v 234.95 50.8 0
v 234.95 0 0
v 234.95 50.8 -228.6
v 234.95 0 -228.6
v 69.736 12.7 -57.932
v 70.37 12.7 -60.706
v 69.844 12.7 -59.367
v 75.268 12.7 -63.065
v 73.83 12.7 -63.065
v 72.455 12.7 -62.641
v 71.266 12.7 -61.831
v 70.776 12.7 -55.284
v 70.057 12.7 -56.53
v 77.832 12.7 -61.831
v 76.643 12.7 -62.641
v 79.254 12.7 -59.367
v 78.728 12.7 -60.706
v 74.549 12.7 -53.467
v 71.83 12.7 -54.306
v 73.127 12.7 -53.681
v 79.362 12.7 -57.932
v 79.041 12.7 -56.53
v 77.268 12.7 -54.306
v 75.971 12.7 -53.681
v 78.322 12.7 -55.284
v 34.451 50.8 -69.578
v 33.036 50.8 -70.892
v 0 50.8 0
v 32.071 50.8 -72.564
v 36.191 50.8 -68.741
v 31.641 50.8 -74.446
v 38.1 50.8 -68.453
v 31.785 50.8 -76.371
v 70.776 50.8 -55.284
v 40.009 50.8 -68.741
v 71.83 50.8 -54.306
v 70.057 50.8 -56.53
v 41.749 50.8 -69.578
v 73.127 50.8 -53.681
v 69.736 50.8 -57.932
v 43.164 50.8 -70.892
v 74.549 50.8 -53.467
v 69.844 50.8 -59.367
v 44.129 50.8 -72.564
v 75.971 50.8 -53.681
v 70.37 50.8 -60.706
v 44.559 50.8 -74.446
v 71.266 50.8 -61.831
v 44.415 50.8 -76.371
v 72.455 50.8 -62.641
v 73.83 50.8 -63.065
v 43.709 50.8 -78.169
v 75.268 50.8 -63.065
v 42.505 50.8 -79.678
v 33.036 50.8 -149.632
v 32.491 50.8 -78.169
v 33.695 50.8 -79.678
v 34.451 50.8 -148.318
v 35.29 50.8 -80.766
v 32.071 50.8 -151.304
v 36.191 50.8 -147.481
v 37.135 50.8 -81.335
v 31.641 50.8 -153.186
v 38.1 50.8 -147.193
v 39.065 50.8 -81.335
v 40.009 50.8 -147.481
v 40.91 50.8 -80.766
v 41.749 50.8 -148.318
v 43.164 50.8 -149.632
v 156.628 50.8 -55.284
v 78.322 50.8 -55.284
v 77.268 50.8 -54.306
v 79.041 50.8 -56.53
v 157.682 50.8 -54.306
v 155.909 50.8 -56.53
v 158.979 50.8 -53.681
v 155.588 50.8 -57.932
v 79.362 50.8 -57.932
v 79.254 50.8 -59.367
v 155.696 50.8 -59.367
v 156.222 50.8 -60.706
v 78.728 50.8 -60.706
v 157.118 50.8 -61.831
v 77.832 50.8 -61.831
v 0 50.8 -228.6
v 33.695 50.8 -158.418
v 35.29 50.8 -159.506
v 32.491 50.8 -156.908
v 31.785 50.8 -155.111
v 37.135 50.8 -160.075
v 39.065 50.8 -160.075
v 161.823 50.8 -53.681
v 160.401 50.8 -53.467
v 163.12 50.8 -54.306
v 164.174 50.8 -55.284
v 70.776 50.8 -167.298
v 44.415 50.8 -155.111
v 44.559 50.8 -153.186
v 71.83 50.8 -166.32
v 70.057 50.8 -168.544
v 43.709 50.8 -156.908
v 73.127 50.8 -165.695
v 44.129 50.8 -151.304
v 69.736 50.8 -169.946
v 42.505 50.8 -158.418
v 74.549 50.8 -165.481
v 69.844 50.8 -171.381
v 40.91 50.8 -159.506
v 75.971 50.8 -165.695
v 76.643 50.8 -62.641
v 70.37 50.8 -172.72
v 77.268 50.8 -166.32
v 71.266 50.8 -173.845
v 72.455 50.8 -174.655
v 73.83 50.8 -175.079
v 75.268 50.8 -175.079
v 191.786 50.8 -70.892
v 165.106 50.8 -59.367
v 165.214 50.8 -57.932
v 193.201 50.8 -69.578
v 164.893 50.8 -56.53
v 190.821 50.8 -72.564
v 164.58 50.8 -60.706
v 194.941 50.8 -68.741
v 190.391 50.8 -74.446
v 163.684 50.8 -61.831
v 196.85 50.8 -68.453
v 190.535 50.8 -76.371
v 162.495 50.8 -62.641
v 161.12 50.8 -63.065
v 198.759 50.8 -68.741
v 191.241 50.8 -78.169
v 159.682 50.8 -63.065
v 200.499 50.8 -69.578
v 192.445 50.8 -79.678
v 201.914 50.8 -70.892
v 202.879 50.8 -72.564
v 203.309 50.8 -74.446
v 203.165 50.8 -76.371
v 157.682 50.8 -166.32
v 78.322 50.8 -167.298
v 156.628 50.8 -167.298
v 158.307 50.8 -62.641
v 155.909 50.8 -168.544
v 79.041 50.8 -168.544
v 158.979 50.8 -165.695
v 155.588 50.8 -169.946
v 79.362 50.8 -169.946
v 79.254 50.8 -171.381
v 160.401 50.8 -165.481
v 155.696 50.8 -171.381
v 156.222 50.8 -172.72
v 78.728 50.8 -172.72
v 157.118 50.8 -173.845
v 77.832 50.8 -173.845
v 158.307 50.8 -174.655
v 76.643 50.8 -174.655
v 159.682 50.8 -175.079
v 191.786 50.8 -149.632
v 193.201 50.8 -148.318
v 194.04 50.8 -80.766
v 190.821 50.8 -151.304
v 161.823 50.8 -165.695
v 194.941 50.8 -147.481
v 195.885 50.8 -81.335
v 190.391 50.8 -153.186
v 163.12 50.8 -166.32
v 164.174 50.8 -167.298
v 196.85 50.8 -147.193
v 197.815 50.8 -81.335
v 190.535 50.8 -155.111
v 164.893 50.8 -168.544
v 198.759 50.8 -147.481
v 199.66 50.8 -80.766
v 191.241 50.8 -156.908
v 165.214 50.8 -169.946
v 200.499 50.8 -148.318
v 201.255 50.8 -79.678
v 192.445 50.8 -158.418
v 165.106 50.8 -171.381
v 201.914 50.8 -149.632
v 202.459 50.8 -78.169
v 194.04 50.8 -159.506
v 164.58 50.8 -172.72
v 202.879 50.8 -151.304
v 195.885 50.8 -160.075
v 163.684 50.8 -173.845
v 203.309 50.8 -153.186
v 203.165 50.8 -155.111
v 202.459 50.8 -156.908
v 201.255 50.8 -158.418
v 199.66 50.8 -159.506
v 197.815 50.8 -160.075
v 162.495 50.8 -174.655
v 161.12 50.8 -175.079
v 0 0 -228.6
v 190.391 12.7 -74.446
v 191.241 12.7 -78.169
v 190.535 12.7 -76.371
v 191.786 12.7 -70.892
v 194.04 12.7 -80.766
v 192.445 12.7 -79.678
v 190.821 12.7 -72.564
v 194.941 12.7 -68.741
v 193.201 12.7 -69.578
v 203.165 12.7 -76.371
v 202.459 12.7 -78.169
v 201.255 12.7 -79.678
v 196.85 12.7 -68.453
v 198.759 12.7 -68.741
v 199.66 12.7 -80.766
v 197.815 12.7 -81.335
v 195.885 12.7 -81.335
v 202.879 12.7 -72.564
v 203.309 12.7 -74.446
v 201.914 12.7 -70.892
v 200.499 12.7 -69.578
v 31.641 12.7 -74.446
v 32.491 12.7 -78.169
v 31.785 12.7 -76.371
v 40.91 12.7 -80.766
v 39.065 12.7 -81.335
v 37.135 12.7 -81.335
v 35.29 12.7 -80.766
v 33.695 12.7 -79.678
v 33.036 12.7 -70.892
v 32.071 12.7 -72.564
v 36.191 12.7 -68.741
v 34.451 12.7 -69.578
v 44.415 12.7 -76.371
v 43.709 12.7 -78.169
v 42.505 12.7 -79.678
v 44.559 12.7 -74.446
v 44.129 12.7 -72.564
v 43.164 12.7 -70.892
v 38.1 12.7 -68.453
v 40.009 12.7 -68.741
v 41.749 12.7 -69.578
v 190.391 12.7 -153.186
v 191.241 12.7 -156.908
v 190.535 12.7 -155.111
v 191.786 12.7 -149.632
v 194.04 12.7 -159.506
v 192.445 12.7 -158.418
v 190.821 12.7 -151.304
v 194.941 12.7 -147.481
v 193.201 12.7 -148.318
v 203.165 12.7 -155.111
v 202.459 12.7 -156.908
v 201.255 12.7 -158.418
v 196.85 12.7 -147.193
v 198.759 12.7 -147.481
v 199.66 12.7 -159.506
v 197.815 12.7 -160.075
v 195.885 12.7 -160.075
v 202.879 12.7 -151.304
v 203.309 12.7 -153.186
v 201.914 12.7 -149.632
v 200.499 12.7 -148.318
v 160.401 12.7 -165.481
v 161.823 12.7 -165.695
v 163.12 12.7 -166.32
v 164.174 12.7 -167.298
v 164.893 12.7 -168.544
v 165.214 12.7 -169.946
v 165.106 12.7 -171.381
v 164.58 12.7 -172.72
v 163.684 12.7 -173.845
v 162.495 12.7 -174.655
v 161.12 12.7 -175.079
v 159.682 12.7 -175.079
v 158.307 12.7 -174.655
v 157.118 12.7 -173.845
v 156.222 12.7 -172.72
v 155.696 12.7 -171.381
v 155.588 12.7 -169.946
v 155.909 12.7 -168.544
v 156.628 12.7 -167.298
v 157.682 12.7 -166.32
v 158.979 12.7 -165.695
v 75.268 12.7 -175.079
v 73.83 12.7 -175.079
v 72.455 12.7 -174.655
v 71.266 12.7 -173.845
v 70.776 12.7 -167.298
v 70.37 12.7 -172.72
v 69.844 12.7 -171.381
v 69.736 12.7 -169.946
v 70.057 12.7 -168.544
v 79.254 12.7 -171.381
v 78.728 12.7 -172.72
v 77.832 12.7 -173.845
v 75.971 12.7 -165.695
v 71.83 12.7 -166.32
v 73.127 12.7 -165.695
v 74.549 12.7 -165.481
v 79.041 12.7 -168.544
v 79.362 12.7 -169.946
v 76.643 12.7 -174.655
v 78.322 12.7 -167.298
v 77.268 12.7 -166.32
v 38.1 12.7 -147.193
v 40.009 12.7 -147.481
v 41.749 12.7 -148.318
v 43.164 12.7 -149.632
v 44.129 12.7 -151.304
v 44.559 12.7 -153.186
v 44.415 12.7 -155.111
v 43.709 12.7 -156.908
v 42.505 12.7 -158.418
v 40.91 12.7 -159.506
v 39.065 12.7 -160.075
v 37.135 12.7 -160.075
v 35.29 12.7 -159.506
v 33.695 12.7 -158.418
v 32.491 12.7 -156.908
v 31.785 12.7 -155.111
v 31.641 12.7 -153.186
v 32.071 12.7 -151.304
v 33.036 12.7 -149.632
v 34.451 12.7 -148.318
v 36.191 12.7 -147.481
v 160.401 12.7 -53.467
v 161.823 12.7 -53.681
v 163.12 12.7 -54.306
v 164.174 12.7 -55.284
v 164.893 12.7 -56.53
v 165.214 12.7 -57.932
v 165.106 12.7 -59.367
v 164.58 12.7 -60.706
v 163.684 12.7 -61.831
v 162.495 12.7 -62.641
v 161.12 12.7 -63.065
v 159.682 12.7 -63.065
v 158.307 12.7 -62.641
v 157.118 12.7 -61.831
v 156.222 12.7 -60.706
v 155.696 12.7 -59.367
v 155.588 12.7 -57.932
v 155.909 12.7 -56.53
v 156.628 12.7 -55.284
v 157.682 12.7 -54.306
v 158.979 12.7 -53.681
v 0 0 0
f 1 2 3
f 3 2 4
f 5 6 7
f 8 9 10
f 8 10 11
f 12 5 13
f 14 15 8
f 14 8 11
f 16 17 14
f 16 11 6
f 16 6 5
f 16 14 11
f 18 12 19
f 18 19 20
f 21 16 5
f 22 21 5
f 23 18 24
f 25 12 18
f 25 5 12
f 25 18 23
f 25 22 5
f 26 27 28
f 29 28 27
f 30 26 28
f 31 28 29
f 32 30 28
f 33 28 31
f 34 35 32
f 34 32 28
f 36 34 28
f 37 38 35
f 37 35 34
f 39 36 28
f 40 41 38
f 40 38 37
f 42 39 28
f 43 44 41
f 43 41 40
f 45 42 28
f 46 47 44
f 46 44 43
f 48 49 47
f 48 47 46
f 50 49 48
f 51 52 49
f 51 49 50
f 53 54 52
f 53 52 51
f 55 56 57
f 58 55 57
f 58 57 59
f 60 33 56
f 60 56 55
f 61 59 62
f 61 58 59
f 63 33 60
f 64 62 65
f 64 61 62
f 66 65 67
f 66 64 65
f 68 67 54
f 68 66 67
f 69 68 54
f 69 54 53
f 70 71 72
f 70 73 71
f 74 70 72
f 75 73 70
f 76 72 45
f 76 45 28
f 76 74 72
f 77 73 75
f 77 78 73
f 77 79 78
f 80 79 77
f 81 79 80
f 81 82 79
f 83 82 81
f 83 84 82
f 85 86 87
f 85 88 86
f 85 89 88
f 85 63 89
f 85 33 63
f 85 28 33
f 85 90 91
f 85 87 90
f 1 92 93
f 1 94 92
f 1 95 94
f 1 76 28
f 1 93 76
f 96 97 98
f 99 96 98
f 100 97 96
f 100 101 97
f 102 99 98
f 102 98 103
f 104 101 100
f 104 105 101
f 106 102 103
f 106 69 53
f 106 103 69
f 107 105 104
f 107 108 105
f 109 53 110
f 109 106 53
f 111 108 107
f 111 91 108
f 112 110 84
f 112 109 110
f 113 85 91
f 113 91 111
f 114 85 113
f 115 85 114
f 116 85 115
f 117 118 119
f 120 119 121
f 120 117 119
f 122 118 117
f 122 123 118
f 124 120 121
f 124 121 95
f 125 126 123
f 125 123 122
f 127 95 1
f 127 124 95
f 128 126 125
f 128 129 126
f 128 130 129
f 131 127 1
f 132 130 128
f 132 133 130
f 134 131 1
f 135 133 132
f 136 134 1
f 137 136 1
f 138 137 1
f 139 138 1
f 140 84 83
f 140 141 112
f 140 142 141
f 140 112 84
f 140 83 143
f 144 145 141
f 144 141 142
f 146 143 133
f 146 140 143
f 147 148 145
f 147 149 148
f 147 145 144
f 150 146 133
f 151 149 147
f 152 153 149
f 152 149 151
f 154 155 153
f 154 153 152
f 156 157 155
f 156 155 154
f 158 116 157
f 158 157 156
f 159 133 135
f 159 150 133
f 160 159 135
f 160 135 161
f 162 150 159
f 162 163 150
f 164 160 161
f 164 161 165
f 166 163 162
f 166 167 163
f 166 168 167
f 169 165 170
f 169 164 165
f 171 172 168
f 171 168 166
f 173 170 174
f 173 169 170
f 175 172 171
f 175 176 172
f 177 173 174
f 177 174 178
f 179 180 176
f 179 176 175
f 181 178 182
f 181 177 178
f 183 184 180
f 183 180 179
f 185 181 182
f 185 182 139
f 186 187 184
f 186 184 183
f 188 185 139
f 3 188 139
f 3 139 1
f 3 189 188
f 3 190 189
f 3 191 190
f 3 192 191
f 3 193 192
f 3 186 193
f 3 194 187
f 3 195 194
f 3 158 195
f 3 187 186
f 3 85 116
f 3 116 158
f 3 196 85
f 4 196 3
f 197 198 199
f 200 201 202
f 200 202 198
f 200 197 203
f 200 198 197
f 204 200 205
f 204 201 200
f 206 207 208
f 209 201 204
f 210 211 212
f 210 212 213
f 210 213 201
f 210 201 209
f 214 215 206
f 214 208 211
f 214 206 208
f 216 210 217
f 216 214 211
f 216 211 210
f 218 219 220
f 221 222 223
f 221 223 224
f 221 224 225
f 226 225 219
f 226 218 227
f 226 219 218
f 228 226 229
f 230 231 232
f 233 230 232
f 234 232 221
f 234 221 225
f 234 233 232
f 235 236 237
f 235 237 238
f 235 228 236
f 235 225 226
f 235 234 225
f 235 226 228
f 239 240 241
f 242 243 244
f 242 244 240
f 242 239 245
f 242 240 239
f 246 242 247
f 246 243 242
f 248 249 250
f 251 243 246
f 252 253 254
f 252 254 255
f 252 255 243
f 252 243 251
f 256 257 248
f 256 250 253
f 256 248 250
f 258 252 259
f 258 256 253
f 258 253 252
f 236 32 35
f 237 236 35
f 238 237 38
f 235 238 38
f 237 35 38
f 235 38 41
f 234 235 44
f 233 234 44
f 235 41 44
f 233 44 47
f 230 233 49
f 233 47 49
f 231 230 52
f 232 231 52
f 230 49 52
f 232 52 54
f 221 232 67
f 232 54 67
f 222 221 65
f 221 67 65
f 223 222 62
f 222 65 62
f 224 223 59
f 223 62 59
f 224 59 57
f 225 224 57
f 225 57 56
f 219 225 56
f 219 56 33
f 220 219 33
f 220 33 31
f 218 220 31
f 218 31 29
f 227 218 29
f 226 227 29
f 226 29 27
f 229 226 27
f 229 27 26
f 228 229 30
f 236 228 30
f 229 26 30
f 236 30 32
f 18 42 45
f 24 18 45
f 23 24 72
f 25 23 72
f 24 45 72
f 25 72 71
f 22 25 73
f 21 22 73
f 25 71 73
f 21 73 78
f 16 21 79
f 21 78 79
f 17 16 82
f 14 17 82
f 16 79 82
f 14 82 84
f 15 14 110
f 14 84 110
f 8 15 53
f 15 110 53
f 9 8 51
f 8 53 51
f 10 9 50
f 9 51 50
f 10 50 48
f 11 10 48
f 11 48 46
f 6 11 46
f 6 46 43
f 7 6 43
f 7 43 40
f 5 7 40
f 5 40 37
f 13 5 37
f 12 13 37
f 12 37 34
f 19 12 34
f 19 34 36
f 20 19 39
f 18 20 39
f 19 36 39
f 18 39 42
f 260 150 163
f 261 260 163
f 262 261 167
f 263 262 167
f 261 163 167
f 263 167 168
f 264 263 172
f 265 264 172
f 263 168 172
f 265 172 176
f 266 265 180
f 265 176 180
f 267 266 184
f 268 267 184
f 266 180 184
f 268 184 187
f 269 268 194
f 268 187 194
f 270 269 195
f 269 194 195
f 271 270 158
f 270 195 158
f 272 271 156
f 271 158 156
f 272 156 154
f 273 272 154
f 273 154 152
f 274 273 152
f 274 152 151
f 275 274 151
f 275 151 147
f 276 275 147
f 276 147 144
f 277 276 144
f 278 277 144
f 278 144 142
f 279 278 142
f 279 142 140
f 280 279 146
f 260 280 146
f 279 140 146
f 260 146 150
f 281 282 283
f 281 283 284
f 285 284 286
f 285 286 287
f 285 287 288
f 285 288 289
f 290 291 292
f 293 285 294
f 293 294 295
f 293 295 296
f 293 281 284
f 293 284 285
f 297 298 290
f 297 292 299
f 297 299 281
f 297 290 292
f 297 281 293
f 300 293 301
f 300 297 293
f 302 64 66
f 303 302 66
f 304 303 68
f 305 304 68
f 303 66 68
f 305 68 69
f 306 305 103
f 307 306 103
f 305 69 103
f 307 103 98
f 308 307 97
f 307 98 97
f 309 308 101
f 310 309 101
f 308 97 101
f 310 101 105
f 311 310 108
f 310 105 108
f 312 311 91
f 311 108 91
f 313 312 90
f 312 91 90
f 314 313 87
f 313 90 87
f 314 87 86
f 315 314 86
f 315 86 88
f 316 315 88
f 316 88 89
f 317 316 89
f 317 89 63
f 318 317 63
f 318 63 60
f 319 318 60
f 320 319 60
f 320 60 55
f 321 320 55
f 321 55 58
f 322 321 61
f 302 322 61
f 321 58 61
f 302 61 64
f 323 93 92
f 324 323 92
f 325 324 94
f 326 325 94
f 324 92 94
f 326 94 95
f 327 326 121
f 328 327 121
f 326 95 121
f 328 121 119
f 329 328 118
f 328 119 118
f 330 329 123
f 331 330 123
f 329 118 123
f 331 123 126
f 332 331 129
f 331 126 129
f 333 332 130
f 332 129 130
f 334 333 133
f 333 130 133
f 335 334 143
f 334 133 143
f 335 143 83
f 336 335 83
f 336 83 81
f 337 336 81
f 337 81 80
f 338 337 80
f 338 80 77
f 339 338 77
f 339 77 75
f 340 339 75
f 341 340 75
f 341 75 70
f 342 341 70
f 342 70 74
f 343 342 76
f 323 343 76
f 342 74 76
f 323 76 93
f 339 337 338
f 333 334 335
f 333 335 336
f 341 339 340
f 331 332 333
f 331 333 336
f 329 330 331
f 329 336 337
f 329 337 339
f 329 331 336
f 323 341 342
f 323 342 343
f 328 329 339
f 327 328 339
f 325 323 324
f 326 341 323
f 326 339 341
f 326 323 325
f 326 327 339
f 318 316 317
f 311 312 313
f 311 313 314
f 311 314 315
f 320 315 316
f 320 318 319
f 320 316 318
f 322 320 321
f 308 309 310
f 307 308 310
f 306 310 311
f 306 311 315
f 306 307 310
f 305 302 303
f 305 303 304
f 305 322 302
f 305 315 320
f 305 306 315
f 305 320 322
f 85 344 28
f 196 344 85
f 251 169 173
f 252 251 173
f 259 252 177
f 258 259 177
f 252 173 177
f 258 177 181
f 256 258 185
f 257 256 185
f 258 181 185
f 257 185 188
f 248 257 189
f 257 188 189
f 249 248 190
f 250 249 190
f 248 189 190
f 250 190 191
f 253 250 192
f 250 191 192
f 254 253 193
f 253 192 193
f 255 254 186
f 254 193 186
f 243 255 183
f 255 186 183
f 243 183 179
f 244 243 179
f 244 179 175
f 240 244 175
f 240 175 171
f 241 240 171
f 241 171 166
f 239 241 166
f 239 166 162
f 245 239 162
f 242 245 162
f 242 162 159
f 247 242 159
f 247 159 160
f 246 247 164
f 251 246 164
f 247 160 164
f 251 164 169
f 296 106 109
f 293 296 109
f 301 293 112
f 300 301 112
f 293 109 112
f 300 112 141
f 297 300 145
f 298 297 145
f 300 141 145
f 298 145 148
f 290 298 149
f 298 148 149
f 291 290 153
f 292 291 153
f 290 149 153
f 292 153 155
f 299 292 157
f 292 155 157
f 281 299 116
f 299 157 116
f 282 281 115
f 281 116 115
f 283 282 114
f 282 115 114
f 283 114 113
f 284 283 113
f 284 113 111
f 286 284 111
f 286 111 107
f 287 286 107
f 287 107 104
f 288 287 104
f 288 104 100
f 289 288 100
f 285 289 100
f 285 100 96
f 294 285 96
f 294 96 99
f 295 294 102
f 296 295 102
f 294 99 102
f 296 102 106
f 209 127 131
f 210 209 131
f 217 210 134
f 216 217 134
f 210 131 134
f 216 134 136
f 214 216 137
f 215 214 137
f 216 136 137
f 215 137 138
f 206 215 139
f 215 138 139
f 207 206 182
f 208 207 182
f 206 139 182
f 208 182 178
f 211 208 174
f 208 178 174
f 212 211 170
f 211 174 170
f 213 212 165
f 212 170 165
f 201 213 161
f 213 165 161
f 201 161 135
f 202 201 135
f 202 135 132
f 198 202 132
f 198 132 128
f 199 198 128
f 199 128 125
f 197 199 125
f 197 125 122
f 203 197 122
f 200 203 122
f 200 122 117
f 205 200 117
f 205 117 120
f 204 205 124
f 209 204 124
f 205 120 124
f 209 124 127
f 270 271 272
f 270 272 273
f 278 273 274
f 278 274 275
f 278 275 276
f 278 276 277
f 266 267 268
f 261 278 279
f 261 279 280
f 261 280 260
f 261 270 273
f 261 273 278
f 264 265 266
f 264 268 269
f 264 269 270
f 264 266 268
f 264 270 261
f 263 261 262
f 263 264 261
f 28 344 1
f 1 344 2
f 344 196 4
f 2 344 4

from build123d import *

# Parameters (mm, degrees)
SKETCH1_W           = 234.95
SKETCH1_H           = 228.6
BOSS_EXTRUDE1_DEPTH = 50.8
SKETCH2_R           = 4.826
CUT_EXTRUDE1_DEPTH  = 38.1
SKETCH3_R           = 6.477
CUT_EXTRUDE2_DEPTH  = 38.1


with BuildPart() as part:
    # Sketch1 → Boss-Extrude1 (new body)
    with BuildSketch(Plane(origin=(0, 0, 0), x_dir=(1, 0, 0), z_dir=(0, 1, 0))):
        with Locations((117.475, 114.3)):
            Rectangle(SKETCH1_W, SKETCH1_H)
    extrude(amount=BOSS_EXTRUDE1_DEPTH)

    # Sketch2 → Cut-Extrude1 (cut)
    with BuildSketch(Plane(origin=(0, 50.8, 0), x_dir=(1, 0, 0), z_dir=(0, 1, 0))):
        with Locations(Location((74.549, 170.307, 0), (0, 0, 270))):
            Circle(SKETCH2_R)
        with Locations(Location((160.401, 170.307, 0), (0, 0, 270))):
            Circle(SKETCH2_R)
        with Locations(Location((160.401, 58.293, 0), (0, 0, 270))):
            Circle(SKETCH2_R)
        with Locations(Location((74.549, 58.293, 0), (0, 0, 270))):
            Circle(SKETCH2_R)
    extrude(amount=-CUT_EXTRUDE1_DEPTH, mode=Mode.SUBTRACT)

    # Sketch3 → Cut-Extrude2 (cut)
    with BuildSketch(Plane(origin=(0, 50.8, 0), x_dir=(1, 0, 0), z_dir=(0, 1, 0))):
        with Locations(Location((196.85, 153.67, 0), (0, 0, 270))):
            Circle(SKETCH3_R)
        with Locations(Location((196.85, 74.93, 0), (0, 0, 270))):
            Circle(SKETCH3_R)
        with Locations(Location((38.1, 74.93, 0), (0, 0, 270))):
            Circle(SKETCH3_R)
        with Locations(Location((38.1, 153.67, 0), (0, 0, 270))):
            Circle(SKETCH3_R)
    extrude(amount=-CUT_EXTRUDE2_DEPTH, mode=Mode.SUBTRACT)


solid = part.part
